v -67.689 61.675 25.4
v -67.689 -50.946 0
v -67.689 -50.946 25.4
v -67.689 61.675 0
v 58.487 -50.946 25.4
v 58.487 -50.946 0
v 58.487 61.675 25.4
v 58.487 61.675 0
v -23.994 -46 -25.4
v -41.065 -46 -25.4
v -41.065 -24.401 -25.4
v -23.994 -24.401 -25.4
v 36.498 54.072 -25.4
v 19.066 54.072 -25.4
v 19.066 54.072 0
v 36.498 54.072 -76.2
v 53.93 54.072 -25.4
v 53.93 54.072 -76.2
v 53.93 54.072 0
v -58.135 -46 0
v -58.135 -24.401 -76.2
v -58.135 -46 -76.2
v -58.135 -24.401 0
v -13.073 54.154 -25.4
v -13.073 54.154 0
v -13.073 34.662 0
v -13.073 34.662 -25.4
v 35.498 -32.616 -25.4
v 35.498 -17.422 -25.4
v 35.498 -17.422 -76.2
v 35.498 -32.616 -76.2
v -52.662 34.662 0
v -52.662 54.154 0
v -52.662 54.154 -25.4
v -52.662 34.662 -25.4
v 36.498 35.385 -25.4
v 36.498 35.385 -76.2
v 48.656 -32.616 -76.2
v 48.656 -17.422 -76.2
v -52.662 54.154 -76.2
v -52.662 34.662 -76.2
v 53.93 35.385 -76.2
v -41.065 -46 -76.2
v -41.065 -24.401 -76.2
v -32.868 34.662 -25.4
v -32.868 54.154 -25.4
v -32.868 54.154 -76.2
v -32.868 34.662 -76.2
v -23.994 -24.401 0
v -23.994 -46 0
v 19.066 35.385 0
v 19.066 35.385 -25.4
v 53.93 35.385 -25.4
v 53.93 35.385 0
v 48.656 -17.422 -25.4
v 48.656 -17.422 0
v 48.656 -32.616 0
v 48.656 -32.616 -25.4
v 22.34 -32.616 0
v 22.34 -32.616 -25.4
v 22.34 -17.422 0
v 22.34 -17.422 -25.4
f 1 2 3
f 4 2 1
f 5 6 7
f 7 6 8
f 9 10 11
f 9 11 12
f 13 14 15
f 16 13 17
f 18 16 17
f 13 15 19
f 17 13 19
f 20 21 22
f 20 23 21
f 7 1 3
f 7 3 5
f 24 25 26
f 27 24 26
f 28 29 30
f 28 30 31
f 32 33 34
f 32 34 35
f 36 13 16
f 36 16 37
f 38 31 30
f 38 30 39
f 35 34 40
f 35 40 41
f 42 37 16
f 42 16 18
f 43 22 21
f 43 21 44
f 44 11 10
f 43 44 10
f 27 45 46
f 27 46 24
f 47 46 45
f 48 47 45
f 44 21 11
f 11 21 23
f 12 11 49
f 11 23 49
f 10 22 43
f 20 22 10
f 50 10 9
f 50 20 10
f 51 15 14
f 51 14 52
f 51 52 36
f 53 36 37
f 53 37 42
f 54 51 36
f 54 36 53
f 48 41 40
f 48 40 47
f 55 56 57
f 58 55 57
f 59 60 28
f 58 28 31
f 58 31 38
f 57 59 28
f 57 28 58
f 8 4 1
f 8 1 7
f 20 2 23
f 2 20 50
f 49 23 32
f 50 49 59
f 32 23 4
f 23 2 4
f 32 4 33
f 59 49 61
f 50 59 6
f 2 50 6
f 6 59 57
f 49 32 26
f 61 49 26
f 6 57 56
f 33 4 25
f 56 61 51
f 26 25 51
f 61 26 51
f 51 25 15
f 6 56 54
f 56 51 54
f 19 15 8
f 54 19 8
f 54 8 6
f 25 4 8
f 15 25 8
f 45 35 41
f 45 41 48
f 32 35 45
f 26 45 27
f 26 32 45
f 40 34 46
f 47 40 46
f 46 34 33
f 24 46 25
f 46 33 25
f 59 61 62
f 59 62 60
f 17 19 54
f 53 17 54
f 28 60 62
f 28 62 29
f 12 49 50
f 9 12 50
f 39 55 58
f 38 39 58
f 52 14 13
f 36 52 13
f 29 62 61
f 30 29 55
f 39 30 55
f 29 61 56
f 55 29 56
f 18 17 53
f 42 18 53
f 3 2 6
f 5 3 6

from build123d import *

# Parameters (mm, degrees)
F0_W      = 126.176424
F0_H      = 112.621017
F1_DEPTH  = 25.4
F2_W      = 26.31655
F2_H      = 15.193862
F3_DEPTH  = 25.4
F4_W      = 34.140256
F4_H      = 21.598417
F5_DEPTH  = 25.4
F7_W      = 34.864582
F7_H      = 18.686838
F8_DEPTH  = 25.4
F6_W      = 39.589775
F6_H      = 19.492015
F11_DEPTH = 25.4
F9_W      = 17.070128
F9_H      = 21.598417
F12_DEPTH = 50.8
F10_W     = 13.158275
F10_H     = 15.193862
F13_DEPTH = 50.8
F14_W     = 17.432291
F14_H     = 18.686838
F15_DEPTH = 50.8
F16_W     = 19.794888
F16_H     = 19.492015
F17_DEPTH = 50.8


with BuildPart() as f1:
    # F0 (on Top) → F1 (new body)
    with BuildSketch(Plane.XY):
        with Locations((-4.600737, 5.364046)):
            Rectangle(F0_W, F0_H)
    extrude(amount=F1_DEPTH)

    # F2 (on face) → F3 (join)
    with BuildSketch(Plane(origin=(0, 0, 0), x_dir=(1, 0, 0), z_dir=(0, 0, -1))):
        with Locations((35.497902, 25.018883)):
            Rectangle(F2_W, F2_H)
    extrude(amount=F3_DEPTH)

    # F4 (on face) → F5 (join)
    with BuildSketch(Plane(origin=(0, 0, 0), x_dir=(1, 0, 0), z_dir=(0, 0, -1))):
        with Locations((-41.06454, 35.200375)):
            Rectangle(F4_W, F4_H)
    extrude(amount=F5_DEPTH)

    # F7 (on face) → F8 (join)
    with BuildSketch(Plane(origin=(0, 0, 0), x_dir=(1, 0, 0), z_dir=(0, 0, -1))):
        with Locations((36.498174, -44.728223)):
            Rectangle(F7_W, F7_H)
    extrude(amount=F8_DEPTH)

    # F6 (on face) → F11 (join)
    with BuildSketch(Plane(origin=(0, 0, 0), x_dir=(1, 0, 0), z_dir=(0, 0, -1))):
        with Locations((-32.867522, -44.407618)):
            Rectangle(F6_W, F6_H)
    extrude(amount=F11_DEPTH)

    # F9 (on face) → F12 (join)
    with BuildSketch(Plane(origin=(0, 0, -25.4), x_dir=(1, 0, 0), z_dir=(0, 0, -1))):
        with Locations((-49.599604, 35.200375)):
            Rectangle(F9_W, F9_H)
    extrude(amount=F12_DEPTH)

    # F10 (on face) → F13 (join)
    with BuildSketch(Plane(origin=(0, 0, -25.4), x_dir=(1, 0, 0), z_dir=(0, 0, -1))):
        with Locations((42.077039, 25.018883)):
            Rectangle(F10_W, F10_H)
    extrude(amount=F13_DEPTH)

    # F14 (on face) → F15 (join)
    with BuildSketch(Plane(origin=(0, 0, -25.4), x_dir=(1, 0, 0), z_dir=(0, 0, -1))):
        with Locations((45.21432, -44.728223)):
            Rectangle(F14_W, F14_H)
    extrude(amount=F15_DEPTH)

    # F16 (on face) → F17 (join)
    with BuildSketch(Plane(origin=(0, 0, -25.4), x_dir=(1, 0, 0), z_dir=(0, 0, -1))):
        with Locations((-42.764966, -44.407618)):
            Rectangle(F16_W, F16_H)
    extrude(amount=F17_DEPTH)


solid = f1.part
